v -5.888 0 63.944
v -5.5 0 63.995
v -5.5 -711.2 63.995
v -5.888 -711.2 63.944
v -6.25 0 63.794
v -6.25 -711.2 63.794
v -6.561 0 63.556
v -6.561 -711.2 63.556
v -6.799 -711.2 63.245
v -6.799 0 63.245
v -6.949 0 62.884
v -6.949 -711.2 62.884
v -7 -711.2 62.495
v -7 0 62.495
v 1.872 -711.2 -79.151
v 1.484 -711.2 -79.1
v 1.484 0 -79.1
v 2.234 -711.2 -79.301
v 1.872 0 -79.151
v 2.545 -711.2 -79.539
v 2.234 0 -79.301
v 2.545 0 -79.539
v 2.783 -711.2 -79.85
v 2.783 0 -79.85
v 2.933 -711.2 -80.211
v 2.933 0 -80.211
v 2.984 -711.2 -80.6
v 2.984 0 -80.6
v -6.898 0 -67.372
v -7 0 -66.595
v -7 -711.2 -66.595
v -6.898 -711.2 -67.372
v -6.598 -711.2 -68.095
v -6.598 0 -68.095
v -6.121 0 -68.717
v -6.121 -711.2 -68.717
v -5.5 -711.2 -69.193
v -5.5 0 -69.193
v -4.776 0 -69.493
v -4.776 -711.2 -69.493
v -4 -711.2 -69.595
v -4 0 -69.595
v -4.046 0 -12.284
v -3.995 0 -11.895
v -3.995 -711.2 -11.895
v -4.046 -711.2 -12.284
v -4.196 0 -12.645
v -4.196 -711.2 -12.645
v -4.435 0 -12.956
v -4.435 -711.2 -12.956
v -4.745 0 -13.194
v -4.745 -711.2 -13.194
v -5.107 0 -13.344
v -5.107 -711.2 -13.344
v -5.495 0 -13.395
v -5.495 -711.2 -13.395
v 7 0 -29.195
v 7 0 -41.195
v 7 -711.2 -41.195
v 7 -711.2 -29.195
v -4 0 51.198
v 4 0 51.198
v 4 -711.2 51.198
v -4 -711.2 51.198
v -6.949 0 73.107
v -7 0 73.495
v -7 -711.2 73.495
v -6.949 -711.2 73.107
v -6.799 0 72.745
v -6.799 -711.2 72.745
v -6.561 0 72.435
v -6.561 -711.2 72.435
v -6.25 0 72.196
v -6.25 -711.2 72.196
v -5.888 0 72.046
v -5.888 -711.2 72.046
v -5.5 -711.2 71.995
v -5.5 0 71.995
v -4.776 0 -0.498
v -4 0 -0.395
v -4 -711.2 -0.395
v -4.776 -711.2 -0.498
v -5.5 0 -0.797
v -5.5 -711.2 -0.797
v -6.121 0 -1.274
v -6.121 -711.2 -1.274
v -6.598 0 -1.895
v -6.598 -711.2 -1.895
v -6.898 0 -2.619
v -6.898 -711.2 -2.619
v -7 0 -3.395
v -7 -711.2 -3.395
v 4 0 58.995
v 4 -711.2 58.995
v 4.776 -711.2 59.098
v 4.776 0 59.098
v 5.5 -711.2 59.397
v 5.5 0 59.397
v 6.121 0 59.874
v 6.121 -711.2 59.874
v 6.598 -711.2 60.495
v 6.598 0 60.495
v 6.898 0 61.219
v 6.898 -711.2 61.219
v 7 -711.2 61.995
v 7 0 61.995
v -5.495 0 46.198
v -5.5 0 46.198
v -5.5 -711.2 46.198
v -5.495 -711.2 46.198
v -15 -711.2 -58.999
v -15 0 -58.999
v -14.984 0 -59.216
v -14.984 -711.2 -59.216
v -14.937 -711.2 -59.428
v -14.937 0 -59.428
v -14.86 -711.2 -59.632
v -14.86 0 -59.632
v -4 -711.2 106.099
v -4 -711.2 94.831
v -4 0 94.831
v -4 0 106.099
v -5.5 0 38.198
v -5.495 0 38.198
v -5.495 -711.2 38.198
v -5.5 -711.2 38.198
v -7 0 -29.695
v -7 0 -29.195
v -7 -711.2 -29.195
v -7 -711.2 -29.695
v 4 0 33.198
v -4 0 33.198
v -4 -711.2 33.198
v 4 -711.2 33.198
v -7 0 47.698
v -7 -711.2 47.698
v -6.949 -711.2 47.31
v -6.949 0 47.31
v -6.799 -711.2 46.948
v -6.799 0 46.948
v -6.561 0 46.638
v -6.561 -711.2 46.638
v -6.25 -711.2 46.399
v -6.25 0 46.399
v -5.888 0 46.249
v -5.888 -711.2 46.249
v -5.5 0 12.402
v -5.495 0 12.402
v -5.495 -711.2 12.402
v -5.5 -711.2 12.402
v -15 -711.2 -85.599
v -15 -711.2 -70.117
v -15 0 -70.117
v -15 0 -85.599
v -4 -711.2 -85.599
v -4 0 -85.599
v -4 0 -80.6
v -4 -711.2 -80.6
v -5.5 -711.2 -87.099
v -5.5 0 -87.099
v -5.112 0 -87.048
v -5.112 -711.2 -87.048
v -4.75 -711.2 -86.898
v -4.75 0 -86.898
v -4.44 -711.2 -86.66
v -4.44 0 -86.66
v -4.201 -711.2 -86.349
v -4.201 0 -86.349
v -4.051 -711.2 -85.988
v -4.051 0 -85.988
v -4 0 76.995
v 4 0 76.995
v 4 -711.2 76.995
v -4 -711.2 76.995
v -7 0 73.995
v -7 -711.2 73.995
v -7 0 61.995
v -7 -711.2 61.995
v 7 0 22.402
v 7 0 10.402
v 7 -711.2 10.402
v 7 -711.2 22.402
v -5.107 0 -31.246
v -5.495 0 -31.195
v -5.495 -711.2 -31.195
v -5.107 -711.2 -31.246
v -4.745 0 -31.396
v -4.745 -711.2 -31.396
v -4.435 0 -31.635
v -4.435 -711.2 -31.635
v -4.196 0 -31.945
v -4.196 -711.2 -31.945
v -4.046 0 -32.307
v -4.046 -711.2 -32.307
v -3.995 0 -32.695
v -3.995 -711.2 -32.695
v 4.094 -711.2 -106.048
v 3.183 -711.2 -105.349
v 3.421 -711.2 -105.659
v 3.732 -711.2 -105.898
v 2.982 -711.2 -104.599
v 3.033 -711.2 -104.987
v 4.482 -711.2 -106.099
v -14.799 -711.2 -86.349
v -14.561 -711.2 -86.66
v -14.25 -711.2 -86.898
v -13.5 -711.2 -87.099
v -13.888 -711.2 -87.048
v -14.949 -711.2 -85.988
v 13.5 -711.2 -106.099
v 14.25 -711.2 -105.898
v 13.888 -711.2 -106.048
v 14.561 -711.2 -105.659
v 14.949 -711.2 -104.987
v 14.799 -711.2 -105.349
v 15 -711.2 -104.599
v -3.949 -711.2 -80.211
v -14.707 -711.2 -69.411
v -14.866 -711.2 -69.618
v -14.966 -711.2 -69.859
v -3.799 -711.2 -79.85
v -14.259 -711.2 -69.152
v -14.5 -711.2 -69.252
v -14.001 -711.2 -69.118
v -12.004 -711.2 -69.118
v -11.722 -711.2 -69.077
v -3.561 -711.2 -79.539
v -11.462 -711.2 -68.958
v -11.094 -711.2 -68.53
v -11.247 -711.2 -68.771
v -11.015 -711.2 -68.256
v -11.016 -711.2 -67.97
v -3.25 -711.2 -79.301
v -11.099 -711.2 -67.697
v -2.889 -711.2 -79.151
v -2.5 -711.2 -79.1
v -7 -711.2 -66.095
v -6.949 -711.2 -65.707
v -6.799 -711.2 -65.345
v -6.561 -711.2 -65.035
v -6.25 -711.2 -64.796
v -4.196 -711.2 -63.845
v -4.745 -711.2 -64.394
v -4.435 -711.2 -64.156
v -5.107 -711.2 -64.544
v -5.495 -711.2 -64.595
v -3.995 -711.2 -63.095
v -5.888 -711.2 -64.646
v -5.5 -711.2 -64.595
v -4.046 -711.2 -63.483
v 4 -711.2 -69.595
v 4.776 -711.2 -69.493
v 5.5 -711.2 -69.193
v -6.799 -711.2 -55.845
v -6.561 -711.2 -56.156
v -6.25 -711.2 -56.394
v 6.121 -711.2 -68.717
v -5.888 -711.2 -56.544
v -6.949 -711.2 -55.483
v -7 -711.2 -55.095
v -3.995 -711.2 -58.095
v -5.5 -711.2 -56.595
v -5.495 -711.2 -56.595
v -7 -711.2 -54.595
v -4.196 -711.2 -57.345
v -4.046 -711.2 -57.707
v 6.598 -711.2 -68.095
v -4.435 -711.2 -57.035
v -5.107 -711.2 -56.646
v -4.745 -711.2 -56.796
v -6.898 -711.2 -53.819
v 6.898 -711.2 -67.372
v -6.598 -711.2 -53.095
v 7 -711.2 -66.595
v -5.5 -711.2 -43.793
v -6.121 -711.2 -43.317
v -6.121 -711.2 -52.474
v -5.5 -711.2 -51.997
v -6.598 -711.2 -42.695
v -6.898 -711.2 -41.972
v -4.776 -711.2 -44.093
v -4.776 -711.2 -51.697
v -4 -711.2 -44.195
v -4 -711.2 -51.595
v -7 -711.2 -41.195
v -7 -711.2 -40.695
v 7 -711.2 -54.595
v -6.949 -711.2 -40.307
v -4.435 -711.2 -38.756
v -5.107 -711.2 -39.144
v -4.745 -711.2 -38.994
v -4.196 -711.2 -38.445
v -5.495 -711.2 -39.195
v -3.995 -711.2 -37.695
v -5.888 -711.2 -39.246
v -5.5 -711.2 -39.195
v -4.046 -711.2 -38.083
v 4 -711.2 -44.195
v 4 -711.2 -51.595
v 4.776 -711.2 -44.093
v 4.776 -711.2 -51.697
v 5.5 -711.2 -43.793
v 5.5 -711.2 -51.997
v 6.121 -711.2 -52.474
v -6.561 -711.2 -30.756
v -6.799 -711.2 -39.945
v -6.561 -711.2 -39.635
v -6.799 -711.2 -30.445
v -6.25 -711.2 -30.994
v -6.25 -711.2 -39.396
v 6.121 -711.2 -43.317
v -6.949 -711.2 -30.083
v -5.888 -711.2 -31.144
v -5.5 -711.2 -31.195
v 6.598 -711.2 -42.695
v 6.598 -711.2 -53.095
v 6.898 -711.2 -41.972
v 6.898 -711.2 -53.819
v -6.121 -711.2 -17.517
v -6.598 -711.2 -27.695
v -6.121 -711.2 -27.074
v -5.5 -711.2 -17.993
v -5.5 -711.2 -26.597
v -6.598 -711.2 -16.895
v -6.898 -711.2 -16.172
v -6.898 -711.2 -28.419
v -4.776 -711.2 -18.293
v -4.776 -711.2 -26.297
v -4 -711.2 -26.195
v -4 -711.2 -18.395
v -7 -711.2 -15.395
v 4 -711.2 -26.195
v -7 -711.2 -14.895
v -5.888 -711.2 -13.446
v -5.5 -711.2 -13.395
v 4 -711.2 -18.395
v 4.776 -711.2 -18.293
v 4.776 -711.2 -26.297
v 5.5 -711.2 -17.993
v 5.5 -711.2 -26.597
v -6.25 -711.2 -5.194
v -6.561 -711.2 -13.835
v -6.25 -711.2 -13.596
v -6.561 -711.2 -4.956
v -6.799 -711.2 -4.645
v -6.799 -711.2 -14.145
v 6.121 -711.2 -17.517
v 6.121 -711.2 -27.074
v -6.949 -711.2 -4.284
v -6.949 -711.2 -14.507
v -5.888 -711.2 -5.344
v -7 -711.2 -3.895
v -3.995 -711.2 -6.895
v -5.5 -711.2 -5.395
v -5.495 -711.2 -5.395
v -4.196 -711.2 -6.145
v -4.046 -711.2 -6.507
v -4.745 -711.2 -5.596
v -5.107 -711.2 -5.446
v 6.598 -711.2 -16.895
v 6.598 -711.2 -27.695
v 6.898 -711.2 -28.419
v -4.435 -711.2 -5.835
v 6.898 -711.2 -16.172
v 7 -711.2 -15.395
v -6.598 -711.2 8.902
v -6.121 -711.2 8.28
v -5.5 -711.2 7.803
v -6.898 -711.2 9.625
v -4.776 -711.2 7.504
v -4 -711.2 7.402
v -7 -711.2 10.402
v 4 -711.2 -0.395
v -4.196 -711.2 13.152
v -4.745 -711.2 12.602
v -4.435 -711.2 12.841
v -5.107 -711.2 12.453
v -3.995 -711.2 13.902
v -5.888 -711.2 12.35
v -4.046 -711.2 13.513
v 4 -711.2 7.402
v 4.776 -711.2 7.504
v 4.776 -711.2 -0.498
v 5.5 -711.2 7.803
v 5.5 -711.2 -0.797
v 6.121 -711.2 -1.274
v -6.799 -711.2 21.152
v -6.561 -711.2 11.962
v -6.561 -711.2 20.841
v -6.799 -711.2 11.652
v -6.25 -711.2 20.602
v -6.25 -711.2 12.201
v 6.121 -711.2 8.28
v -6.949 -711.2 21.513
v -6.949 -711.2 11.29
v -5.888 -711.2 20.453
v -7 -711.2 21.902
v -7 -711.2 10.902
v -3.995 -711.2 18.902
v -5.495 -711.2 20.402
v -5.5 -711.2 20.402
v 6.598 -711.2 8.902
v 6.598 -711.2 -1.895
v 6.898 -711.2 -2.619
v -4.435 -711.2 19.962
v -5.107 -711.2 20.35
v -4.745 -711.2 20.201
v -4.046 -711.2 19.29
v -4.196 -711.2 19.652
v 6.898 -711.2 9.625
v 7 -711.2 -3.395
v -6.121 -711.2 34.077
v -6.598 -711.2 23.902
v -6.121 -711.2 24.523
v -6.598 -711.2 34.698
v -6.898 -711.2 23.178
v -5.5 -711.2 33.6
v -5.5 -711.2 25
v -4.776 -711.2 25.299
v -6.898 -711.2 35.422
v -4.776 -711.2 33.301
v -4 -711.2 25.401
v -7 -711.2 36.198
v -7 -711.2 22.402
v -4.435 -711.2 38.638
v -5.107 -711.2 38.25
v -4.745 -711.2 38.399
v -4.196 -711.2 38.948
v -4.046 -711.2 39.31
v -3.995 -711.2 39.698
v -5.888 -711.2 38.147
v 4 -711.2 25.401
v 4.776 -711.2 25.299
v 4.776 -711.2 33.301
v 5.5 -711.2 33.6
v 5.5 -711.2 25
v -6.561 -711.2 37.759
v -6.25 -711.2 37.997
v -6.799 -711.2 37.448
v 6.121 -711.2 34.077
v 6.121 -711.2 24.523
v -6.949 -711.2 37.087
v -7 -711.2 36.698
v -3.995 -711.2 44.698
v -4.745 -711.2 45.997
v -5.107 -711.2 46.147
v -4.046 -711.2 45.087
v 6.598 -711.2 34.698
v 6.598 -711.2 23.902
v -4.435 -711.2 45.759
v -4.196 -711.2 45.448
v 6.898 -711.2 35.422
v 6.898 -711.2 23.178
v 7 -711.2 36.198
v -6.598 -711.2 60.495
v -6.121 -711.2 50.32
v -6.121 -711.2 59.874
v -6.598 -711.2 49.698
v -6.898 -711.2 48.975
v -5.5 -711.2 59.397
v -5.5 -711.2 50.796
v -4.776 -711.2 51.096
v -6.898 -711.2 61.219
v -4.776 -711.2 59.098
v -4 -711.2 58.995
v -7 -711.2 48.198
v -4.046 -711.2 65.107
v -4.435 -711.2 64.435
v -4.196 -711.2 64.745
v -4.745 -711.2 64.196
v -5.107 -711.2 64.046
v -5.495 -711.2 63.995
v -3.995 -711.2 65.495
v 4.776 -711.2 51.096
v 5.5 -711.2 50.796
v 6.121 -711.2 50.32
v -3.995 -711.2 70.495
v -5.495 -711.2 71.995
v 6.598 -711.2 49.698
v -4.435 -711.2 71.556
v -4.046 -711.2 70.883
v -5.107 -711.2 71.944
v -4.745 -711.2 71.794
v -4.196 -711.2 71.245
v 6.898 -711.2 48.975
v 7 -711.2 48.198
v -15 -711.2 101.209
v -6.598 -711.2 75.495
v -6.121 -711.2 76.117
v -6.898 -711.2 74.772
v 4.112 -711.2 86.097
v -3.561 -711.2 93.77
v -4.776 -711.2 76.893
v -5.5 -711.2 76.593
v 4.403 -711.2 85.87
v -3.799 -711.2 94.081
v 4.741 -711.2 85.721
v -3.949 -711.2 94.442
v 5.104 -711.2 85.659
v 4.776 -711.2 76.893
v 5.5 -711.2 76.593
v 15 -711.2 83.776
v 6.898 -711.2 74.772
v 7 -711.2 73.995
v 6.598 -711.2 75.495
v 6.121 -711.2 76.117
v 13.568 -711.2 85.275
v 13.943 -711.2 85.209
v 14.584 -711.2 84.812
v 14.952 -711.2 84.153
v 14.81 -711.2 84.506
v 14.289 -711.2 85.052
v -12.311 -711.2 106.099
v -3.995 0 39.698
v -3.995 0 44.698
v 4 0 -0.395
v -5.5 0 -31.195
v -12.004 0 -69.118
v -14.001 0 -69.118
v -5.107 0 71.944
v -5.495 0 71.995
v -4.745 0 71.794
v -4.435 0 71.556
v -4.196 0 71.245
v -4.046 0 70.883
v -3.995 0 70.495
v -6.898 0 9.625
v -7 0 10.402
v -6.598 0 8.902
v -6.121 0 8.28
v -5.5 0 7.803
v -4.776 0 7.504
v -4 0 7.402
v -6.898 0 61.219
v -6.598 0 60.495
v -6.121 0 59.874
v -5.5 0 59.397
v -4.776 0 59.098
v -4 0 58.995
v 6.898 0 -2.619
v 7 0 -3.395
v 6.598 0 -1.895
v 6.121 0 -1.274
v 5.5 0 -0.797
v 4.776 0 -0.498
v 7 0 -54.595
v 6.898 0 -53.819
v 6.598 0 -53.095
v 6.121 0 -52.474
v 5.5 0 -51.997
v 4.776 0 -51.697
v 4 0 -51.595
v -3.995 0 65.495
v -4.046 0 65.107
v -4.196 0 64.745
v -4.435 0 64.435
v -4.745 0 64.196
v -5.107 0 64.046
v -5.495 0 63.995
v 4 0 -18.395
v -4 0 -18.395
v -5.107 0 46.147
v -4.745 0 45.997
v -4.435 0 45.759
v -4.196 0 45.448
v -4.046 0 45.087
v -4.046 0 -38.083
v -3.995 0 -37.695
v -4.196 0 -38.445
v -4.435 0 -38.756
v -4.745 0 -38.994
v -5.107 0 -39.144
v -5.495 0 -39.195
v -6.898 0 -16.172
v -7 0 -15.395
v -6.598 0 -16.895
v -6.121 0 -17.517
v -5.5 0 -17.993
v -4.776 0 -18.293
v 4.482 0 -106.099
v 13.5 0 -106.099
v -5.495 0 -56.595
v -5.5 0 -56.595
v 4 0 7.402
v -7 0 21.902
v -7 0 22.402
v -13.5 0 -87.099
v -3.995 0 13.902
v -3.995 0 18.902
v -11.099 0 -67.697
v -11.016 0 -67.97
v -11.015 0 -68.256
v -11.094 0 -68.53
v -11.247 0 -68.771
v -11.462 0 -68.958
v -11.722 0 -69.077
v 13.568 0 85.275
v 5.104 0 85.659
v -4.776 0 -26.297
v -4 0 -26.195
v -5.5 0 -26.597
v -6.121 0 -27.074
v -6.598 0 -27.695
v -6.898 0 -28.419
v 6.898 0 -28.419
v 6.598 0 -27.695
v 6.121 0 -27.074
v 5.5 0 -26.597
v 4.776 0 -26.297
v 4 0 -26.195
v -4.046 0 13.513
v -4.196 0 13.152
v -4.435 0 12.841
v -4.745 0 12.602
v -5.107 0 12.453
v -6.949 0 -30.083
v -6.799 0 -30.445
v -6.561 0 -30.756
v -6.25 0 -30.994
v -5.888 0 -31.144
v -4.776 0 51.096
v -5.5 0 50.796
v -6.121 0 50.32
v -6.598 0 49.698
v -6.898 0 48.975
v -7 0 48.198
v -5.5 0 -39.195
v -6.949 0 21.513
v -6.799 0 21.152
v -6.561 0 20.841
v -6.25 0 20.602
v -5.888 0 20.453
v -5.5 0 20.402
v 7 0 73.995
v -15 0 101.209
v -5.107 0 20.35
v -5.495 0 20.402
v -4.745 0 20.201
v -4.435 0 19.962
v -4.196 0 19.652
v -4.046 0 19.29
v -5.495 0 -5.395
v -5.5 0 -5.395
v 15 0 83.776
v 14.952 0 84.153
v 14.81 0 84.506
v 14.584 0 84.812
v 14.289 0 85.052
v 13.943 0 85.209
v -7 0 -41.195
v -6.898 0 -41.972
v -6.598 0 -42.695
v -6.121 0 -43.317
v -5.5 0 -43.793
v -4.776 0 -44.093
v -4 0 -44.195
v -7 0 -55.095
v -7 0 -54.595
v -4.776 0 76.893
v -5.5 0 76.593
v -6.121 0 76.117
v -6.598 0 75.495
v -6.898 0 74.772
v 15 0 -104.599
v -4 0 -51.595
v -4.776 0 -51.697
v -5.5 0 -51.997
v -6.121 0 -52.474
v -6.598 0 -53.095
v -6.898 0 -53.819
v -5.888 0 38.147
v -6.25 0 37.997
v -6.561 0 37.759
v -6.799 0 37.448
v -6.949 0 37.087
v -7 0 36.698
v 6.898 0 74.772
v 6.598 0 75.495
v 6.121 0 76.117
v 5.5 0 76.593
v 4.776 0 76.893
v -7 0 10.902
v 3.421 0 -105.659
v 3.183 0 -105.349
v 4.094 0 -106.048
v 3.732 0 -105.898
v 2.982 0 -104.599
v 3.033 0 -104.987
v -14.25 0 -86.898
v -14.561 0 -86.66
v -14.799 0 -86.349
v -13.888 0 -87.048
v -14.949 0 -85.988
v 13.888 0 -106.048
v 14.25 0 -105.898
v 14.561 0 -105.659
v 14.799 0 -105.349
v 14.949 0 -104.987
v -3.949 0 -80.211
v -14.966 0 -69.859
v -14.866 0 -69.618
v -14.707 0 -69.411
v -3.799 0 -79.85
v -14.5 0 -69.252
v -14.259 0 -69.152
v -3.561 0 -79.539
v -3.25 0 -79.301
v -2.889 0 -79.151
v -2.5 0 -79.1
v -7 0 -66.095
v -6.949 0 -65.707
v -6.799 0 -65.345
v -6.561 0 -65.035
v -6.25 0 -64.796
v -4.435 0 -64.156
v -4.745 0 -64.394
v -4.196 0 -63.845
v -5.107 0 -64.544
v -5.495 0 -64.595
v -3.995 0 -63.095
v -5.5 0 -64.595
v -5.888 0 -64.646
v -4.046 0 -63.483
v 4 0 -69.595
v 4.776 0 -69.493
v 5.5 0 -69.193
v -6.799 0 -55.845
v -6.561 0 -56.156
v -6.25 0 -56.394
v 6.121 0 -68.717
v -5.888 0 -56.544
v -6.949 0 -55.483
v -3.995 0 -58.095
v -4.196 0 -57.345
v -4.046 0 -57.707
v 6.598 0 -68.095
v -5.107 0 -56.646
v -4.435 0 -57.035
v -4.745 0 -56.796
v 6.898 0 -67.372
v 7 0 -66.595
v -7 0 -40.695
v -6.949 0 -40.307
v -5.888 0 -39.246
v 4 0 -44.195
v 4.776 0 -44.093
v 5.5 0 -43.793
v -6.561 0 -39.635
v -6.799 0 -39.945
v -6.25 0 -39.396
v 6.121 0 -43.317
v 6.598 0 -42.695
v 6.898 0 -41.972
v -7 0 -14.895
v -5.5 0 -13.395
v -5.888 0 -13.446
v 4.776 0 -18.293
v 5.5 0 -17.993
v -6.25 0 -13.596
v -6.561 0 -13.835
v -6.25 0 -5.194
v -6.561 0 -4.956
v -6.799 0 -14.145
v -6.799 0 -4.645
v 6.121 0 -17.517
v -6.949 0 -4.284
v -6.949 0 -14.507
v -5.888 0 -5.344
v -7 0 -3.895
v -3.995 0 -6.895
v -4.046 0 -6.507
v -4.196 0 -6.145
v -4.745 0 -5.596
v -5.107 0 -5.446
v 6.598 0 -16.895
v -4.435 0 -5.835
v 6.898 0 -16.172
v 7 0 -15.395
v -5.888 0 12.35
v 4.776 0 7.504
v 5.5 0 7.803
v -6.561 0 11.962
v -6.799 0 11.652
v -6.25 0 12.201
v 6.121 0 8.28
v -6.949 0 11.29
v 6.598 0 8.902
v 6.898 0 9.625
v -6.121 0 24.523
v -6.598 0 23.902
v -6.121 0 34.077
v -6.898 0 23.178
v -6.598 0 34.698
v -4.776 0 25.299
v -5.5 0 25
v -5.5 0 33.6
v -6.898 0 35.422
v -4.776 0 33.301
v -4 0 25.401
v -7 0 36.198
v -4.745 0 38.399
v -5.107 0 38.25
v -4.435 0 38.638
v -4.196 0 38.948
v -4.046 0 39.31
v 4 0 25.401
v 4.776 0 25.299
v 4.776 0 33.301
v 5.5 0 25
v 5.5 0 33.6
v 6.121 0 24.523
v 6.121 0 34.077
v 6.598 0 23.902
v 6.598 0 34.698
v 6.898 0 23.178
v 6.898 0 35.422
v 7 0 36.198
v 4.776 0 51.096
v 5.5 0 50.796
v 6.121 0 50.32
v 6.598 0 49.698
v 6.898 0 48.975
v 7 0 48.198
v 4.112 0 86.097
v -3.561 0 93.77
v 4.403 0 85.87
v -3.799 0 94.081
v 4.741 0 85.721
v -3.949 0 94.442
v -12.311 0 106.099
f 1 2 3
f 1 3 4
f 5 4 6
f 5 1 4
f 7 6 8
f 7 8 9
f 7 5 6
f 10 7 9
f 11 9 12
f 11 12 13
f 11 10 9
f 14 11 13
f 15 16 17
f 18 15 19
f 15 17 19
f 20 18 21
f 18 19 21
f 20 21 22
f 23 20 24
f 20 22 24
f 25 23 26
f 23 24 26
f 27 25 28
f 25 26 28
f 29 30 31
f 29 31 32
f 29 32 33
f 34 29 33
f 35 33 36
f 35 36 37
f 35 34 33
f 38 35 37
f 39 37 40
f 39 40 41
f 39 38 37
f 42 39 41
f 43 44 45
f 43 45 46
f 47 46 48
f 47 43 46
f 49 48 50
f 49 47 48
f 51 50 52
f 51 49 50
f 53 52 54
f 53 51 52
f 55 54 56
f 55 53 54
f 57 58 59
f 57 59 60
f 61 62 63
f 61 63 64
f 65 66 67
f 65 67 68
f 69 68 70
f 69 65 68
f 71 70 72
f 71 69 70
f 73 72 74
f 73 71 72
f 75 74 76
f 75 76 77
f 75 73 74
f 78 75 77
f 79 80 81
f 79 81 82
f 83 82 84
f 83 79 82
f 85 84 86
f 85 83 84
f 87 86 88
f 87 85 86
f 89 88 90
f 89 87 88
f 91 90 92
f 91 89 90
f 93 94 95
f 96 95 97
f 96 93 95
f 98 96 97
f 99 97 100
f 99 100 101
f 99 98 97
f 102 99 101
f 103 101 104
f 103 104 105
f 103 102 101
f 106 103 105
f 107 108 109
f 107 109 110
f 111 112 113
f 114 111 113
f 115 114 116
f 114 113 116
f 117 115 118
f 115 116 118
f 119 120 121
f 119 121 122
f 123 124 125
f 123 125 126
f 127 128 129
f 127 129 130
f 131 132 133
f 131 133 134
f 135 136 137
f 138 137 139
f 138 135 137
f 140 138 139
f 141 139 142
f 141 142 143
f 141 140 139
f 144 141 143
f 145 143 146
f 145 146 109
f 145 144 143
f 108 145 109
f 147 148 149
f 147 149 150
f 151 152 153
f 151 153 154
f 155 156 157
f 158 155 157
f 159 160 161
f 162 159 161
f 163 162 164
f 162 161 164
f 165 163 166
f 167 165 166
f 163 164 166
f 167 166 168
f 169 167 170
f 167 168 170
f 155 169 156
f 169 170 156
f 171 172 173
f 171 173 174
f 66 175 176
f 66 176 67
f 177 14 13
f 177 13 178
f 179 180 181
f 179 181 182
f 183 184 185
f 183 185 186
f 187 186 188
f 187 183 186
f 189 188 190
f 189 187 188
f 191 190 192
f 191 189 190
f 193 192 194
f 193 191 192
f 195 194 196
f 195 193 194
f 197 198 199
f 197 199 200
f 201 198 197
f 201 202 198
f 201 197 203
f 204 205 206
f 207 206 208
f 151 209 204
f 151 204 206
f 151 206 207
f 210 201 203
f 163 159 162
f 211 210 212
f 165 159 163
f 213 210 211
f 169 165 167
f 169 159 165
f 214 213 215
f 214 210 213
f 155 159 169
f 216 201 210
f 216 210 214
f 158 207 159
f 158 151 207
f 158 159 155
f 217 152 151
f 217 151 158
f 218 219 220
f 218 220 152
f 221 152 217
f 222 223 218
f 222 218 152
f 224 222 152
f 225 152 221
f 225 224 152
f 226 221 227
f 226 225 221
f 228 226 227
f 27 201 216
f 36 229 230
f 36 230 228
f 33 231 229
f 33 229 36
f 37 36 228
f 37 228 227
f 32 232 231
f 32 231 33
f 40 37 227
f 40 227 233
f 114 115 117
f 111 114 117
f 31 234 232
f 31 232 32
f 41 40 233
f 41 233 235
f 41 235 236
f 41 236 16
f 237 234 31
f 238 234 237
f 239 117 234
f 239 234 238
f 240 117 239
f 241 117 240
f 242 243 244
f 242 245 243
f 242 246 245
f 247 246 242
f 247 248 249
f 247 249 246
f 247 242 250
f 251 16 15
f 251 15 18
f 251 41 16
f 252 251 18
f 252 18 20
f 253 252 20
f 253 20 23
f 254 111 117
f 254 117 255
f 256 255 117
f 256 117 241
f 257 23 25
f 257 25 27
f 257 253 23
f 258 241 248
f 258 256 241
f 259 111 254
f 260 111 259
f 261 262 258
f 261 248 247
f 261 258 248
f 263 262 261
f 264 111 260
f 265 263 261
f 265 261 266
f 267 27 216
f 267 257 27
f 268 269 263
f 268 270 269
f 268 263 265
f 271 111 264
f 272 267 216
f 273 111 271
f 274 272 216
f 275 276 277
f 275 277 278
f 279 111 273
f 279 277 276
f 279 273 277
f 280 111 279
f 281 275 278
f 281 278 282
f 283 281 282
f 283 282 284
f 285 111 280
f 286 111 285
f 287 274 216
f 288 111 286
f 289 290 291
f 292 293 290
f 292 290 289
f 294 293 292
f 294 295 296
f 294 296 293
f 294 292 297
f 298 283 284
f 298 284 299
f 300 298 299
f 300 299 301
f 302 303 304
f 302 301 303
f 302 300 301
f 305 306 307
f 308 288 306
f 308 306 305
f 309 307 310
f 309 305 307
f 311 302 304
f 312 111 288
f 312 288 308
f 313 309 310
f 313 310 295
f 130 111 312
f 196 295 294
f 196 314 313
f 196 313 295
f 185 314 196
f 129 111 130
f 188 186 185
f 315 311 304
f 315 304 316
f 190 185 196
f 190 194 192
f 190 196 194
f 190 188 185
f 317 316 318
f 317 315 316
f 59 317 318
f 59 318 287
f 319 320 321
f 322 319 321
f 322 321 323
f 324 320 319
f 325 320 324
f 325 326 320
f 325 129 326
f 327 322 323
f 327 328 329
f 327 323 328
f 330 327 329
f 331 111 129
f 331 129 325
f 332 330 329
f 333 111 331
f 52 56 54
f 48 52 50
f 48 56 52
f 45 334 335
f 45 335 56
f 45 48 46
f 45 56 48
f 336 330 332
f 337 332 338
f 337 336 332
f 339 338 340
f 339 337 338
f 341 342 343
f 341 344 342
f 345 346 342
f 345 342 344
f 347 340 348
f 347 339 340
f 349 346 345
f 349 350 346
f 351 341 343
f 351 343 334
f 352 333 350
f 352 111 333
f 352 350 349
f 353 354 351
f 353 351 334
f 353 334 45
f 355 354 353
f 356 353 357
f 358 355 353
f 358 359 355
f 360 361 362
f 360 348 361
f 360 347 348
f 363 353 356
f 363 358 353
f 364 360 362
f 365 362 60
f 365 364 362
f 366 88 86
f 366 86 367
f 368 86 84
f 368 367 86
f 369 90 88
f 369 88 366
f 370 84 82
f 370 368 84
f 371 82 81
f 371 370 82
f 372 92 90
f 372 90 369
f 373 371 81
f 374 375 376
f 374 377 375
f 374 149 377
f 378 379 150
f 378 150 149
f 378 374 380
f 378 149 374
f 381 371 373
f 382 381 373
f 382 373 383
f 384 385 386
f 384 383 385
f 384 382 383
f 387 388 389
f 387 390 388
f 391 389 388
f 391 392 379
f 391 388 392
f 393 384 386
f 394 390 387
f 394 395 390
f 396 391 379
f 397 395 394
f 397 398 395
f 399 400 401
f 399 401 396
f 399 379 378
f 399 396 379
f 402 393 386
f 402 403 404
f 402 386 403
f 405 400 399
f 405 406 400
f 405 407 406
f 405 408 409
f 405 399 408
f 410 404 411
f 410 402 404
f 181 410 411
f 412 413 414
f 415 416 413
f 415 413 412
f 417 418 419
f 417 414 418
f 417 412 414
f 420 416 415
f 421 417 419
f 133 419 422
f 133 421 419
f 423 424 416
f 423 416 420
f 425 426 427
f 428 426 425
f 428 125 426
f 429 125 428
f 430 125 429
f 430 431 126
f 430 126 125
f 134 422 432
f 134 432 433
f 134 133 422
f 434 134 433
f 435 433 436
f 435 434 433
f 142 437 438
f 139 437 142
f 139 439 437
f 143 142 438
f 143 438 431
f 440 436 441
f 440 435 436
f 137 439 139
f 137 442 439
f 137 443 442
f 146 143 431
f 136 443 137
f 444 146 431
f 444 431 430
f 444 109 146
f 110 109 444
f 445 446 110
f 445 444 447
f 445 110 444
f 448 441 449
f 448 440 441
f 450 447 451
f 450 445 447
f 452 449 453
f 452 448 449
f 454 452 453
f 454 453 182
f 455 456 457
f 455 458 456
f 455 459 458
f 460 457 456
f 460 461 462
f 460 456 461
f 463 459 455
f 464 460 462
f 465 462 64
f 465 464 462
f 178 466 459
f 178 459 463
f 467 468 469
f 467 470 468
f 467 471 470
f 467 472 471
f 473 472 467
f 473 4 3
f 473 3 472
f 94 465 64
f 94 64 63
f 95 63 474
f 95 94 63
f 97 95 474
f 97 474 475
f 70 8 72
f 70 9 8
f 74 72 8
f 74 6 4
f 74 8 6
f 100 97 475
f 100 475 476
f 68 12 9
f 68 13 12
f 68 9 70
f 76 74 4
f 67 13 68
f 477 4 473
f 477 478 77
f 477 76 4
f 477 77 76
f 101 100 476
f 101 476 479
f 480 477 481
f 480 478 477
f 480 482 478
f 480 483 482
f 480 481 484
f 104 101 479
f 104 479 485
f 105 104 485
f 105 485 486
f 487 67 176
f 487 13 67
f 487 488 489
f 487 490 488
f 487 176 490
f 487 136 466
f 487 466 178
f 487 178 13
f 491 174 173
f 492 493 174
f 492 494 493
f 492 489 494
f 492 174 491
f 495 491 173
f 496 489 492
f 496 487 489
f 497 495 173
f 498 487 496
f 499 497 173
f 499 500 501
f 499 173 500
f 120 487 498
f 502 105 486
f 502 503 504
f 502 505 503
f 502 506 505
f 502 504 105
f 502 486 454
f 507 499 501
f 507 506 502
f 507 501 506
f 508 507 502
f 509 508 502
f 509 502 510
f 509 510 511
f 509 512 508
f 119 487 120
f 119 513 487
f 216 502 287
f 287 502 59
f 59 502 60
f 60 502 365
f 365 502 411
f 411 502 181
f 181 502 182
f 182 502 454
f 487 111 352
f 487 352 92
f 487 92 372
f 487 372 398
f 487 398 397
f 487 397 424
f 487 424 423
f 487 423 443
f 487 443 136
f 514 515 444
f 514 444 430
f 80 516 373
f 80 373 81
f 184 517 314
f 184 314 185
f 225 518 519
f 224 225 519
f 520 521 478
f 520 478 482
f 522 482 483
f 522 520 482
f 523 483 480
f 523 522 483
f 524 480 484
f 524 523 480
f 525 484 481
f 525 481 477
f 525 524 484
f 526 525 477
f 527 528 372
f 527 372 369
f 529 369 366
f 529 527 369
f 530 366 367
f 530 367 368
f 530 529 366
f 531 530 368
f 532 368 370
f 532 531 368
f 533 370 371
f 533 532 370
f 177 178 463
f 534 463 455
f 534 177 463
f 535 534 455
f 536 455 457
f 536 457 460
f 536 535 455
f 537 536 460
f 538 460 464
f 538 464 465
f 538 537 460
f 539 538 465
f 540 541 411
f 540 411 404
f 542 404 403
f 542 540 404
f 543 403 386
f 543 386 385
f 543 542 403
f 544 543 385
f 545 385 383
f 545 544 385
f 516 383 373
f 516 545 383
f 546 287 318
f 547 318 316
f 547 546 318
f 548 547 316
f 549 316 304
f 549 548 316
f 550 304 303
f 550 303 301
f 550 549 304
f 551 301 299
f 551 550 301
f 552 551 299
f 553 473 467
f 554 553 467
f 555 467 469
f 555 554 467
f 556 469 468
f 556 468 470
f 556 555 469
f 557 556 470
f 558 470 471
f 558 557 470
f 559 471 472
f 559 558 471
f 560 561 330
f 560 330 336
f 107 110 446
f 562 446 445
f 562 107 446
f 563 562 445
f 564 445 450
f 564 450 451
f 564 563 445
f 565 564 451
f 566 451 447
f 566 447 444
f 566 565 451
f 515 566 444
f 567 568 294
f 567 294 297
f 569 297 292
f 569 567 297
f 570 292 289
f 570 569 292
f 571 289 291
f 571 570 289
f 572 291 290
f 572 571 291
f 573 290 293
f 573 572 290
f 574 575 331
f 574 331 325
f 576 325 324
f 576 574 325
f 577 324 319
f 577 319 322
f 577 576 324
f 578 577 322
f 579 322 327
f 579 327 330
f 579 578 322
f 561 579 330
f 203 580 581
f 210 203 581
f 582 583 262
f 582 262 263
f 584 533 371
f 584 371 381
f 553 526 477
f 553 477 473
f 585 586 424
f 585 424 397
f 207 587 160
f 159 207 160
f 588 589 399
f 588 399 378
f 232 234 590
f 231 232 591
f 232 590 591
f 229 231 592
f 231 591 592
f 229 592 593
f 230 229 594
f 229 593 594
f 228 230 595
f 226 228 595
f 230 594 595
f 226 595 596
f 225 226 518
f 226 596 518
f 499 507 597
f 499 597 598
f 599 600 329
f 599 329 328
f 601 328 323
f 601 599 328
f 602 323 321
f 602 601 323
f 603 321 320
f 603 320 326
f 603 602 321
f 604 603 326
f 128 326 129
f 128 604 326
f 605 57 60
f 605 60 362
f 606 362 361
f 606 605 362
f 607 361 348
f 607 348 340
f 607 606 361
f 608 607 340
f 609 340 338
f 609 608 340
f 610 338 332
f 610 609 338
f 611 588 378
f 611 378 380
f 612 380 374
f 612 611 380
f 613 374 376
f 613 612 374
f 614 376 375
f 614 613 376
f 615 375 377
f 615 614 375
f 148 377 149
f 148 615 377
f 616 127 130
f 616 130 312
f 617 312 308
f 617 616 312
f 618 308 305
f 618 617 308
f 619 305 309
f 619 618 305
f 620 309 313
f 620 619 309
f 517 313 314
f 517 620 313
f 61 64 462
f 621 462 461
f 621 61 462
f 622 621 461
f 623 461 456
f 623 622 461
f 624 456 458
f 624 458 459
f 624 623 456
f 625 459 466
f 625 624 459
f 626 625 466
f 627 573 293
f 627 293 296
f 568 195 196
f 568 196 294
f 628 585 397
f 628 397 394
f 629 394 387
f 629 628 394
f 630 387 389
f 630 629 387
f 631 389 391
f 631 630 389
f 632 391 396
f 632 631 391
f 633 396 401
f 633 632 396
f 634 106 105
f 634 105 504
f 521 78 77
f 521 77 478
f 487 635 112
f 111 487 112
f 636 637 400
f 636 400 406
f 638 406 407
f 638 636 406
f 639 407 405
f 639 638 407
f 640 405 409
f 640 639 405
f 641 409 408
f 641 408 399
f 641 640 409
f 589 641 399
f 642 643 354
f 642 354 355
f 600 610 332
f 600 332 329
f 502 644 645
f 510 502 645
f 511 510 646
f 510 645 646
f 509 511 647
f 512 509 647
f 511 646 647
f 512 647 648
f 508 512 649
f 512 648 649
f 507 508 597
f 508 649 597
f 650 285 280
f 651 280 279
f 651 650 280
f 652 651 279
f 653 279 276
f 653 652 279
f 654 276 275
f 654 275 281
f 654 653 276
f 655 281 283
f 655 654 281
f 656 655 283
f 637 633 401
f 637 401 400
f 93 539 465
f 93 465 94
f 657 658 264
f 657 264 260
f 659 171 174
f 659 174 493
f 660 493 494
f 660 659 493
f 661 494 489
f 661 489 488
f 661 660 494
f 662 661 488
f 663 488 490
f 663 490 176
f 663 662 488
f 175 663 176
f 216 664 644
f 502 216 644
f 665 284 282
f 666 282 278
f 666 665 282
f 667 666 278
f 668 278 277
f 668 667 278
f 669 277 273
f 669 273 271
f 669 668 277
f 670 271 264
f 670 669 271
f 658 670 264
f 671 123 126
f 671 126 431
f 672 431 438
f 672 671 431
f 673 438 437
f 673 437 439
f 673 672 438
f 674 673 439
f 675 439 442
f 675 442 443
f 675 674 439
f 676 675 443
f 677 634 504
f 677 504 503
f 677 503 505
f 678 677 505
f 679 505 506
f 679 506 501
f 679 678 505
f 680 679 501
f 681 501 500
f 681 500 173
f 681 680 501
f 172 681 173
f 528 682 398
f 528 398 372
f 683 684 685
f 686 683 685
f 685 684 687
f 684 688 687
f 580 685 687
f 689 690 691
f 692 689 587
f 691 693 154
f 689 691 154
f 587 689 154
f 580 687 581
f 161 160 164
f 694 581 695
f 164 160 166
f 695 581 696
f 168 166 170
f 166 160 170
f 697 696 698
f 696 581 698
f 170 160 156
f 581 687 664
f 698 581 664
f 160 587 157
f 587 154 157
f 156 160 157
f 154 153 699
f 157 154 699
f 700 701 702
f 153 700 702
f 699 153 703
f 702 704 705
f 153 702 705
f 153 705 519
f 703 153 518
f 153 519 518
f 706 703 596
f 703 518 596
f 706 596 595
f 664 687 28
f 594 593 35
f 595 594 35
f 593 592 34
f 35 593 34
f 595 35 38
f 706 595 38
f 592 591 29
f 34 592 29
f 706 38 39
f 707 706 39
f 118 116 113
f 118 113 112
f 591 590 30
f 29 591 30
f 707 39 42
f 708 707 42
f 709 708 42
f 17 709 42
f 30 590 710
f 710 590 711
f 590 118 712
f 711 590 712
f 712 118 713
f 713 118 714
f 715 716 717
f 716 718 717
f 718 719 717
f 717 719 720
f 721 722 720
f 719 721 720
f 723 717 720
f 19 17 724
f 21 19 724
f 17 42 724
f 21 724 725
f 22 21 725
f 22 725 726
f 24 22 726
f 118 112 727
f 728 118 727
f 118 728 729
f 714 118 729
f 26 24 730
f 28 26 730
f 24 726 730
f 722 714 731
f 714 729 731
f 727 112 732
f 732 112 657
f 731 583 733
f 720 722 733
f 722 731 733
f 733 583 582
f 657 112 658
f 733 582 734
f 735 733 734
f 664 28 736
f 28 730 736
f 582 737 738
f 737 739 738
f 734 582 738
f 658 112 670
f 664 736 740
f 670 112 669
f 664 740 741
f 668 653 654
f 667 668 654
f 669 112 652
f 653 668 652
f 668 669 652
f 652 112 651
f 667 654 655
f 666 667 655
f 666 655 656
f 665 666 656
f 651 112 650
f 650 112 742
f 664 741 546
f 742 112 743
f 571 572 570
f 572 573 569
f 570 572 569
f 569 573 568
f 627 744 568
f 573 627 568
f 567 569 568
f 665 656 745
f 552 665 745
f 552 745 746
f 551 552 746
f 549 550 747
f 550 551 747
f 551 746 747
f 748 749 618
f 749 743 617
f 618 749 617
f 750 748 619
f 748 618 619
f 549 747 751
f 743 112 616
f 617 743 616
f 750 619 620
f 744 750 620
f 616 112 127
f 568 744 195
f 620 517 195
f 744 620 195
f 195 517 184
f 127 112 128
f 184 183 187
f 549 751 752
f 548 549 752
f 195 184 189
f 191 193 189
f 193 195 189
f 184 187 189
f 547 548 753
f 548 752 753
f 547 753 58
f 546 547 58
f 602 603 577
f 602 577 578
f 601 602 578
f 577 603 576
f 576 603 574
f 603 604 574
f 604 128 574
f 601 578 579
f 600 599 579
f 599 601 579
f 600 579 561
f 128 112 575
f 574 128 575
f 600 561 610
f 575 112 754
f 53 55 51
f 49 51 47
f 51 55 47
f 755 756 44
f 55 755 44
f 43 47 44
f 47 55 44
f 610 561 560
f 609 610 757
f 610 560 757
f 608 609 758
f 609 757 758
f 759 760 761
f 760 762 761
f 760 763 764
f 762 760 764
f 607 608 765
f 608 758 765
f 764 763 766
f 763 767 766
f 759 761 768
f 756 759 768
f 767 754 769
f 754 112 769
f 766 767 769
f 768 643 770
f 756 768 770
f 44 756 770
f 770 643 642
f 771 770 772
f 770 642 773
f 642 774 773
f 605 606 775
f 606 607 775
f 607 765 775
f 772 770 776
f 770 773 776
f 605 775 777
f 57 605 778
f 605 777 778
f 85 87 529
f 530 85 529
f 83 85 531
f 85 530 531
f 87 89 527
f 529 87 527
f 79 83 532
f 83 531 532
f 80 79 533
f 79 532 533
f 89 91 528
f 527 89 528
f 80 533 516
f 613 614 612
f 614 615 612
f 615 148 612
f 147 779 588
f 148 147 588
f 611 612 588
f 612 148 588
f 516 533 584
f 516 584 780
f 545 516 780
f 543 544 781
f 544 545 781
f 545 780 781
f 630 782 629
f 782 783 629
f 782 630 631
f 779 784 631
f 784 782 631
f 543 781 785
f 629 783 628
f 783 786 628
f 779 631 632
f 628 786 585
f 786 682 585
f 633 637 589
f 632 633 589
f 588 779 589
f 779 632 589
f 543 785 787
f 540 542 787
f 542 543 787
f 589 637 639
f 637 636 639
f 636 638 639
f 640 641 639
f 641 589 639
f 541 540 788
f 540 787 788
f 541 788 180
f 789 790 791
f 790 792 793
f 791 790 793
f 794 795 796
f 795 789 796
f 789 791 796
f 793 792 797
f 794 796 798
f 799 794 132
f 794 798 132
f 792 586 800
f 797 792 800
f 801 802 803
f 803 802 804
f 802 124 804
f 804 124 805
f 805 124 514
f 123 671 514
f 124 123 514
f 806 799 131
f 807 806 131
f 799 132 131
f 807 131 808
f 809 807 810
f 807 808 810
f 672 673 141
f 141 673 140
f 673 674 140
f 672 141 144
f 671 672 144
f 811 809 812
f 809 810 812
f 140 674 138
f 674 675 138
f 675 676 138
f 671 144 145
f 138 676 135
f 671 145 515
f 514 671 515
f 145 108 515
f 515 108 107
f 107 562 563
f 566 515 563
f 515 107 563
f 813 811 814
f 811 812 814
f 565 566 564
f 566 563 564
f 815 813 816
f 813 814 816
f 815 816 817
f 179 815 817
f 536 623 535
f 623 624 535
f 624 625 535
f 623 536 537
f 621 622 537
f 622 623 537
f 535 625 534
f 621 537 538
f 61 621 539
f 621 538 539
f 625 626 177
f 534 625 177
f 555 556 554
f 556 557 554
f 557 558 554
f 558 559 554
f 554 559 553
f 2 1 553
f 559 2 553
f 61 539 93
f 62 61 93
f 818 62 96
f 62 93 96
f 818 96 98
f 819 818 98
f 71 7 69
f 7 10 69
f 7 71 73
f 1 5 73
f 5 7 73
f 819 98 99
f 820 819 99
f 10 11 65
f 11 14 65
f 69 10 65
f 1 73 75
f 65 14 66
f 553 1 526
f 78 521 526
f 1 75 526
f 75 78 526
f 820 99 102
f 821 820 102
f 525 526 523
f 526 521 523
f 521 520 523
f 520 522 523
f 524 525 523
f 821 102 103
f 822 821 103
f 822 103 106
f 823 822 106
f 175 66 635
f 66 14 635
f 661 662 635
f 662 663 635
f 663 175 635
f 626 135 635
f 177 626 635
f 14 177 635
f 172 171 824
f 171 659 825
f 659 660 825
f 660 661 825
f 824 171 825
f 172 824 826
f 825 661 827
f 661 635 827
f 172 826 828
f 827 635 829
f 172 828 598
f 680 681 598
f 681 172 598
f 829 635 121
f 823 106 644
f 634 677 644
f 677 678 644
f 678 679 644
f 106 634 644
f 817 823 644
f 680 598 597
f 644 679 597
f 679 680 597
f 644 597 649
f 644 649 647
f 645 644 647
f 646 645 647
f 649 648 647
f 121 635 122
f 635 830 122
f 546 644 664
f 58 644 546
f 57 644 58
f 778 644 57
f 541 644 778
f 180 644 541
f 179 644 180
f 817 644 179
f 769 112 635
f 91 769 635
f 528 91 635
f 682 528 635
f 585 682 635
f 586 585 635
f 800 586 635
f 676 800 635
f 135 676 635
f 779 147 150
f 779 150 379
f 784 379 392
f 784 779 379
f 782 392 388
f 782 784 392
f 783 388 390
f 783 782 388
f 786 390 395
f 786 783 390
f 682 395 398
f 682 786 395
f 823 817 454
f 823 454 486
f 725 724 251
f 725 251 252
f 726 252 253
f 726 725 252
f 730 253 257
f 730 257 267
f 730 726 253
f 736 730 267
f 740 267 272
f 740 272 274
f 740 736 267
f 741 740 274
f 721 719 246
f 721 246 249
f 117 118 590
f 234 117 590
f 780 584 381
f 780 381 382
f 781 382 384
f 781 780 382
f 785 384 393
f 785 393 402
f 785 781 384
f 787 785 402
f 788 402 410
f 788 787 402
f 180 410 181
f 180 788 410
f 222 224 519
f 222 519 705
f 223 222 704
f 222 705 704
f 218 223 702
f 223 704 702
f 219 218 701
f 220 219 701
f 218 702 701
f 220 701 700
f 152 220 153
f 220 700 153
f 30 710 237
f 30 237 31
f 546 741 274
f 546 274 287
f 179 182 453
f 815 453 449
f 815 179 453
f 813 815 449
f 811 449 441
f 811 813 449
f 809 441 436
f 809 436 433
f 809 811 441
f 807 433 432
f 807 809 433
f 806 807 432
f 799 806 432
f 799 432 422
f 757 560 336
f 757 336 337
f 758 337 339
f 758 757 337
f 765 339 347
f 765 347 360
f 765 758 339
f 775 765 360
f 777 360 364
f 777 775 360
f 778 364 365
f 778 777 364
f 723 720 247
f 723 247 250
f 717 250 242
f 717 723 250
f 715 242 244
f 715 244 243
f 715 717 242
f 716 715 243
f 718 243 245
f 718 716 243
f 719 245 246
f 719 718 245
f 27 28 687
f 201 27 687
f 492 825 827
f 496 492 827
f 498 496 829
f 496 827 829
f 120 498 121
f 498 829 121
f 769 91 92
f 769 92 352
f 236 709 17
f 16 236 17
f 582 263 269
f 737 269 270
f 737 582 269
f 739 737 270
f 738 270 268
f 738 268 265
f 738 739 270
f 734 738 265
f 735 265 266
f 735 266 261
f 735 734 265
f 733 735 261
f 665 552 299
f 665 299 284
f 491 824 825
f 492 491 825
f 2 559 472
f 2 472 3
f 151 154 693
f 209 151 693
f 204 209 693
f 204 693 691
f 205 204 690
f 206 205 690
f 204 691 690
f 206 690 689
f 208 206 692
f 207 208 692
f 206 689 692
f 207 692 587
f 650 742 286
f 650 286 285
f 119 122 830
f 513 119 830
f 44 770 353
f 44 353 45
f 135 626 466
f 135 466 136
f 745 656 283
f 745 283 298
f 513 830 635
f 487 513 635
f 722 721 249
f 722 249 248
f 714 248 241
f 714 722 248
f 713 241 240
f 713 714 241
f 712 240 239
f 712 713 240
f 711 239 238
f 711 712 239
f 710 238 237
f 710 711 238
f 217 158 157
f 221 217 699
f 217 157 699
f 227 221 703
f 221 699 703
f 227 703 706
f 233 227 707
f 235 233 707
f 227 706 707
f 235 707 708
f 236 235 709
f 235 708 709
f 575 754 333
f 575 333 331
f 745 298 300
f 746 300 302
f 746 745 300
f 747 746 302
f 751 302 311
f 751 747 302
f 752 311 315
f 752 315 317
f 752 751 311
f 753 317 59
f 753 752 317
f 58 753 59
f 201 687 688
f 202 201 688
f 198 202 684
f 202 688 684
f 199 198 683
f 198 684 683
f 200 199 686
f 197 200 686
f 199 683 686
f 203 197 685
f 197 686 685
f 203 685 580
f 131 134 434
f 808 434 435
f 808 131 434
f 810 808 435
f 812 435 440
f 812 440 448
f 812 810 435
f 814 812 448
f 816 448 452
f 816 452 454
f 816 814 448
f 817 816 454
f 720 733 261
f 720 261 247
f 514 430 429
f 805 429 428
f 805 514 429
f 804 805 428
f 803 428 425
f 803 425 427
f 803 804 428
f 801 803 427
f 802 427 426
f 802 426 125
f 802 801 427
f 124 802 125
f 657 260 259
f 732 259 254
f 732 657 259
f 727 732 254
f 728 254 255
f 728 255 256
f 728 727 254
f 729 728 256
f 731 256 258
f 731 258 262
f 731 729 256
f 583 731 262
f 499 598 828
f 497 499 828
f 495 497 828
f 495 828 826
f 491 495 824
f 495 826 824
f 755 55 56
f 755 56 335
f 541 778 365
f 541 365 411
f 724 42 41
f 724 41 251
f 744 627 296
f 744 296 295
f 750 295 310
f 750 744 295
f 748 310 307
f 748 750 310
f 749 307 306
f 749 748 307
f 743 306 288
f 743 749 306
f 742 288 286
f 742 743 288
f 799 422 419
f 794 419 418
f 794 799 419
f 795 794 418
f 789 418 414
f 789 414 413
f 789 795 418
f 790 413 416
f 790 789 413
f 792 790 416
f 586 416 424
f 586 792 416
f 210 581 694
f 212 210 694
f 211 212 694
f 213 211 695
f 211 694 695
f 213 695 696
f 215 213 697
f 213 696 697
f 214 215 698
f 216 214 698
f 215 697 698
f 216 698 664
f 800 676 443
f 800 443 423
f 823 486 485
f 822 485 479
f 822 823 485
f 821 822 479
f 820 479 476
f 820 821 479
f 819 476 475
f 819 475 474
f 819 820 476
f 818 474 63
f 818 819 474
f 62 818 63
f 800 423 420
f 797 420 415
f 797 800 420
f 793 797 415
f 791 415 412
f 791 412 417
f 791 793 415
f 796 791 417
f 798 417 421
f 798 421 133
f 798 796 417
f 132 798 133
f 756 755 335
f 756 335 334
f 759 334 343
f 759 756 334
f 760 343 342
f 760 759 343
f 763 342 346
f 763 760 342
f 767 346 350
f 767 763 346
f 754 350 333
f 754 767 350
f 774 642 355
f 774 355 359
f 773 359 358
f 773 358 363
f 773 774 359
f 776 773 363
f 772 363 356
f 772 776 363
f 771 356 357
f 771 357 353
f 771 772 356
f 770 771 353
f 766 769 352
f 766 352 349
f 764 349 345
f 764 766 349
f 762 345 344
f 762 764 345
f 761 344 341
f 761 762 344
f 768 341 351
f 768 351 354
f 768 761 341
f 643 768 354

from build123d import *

# Parameters (mm, degrees)
F1_DEPTH = 711.2
F3_DEPTH = 711.2


# Not quite as in the source:
# - ends of sketch curves that miss each other by under 0.0002 mm in the source are joined


with BuildPart() as f1:
    # F0 (on Front) → F1 (new body)
    with BuildSketch(Plane.XZ):
        with BuildLine():
            ThreePointArc((-14.9999680608, -58.9985104), (-14.96444377, -59.322873513), (-14.8595551032, -59.6318585804))
            Line((-14.8595551032, -59.6318585804), (-11.0988328608, -67.6967912))
            ThreePointArc((-11.0988328608, -67.6967912), (-11.1617050028, -68.655791158), (-12.004294, -69.1180454046))
            Line((-12.004294, -69.1180454046), (-14.0009118, -69.1180736))
            ThreePointArc((-14.0009118, -69.1180736), (-14.707352628, -69.410690972), (-14.99997, -70.1171318))
            Line((-14.99997, -70.1171318), (-14.99997, -85.599397))
            ThreePointArc((-14.99997, -85.599397), (-14.5606310505, -86.6600550505), (-13.499973, -87.099394))
            Line((-13.499973, -87.099394), (-5.5003446, -87.099394))
            ThreePointArc((-5.5003446, -87.099394), (-4.4396865495, -86.6600550505), (-4.0003476, -85.599397))
            Line((-4.0003476, -85.599397), (-4.0003476, -80.5996356))
            ThreePointArc((-4.0003476, -80.5996356), (-3.5610086505, -79.5389775495), (-2.5003506, -79.0996386))
            Line((-2.5003506, -79.0996386), (1.4838426, -79.0996386))
            ThreePointArc((1.4838426, -79.0996386), (2.5445365709, -79.5390134712), (2.9838395966, -80.5997372))
            Line((2.9838395966, -80.5997372), (2.98196, -104.5986224))
            ThreePointArc((2.98196, -104.5986224), (3.4212540492, -105.6593625482), (4.481957, -106.0987464))
            Line((4.481957, -106.0987464), (13.499973, -106.0987464))
            ThreePointArc((13.499973, -106.0987464), (14.5606310505, -105.6594074505), (14.99997, -104.5987494))
            Line((14.99997, -104.5987494), (14.99997, 83.7761342))
            ThreePointArc((14.99997, 83.7761342), (14.5844487053, 84.8124273268), (13.5680958768, 85.2745834897))
            Line((13.5680958768, 85.2745834897), (5.104384, 85.6592902))
            ThreePointArc((5.104384, 85.6592902), (4.5671403109, 85.7853117853), (4.1118233495, 86.0970797495))
            Line((4.1118233495, 86.0970797495), (-3.5610038, 93.7699166))
            ThreePointArc((-3.5610038, 93.7699166), (-3.8861671271, 94.2565457995), (-4.0003476, 94.8305698))
            Line((-4.0003476, 94.8305698), (-4.0003476, 106.0987464))
            Line((-4.0003476, 106.0987464), (-12.3105164, 106.0987464))
            Line((-12.3105164, 106.0987464), (-14.99997, 101.2086876))
            Line((-14.99997, 101.2086876), (-14.9999680608, -58.9985104))
        make_face()
    extrude(amount=F1_DEPTH)

    # F2 (on Front) → F3 (cut)
    with BuildSketch(Plane.XZ):
        with BuildLine():
            ThreePointArc((-5.49529, -31.195264), (-4.4346319495, -31.6346029495), (-3.995293, -32.695261))
            Line((-3.995293, -32.695261), (-3.995293, -37.695251))
            ThreePointArc((-3.995293, -37.695251), (-4.4346319495, -38.7559090505), (-5.49529, -39.195248))
            Line((-5.49529, -39.195248), (-5.499989, -39.195248))
            ThreePointArc((-5.499989, -39.195248), (-6.5606470505, -39.6345869495), (-6.999986, -40.695245))
            Line((-6.999986, -40.695245), (-6.999986, -41.195244))
            ThreePointArc((-6.999986, -41.195244), (-6.1213081009, -43.3165601009), (-3.999992, -44.195238))
            Line((-3.999992, -44.195238), (3.999992, -44.195238))
            ThreePointArc((3.999992, -44.195238), (6.1213081009, -43.3165601009), (6.999986, -41.195244))
            Line((6.999986, -41.195244), (6.999986, -29.195268))
            ThreePointArc((6.999986, -29.195268), (6.1213081009, -27.0739518991), (3.999992, -26.195274))
            Line((3.999992, -26.195274), (-3.999992, -26.195274))
            ThreePointArc((-3.999992, -26.195274), (-6.1213081009, -27.0739518991), (-6.999986, -29.195268))
            Line((-6.999986, -29.195268), (-6.999986, -29.695267))
            ThreePointArc((-6.999986, -29.695267), (-6.5606470505, -30.7559250505), (-5.499989, -31.195264))
            Line((-5.499989, -31.195264), (-5.49529, -31.195264))
        make_face()
        with BuildLine():
            ThreePointArc((-5.49529, -56.595264), (-4.4346319495, -57.0346029495), (-3.995293, -58.095261))
            Line((-3.995293, -58.095261), (-3.995293, -63.095251))
            ThreePointArc((-3.995293, -63.095251), (-4.4346319495, -64.1559090505), (-5.49529, -64.595248))
            Line((-5.49529, -64.595248), (-5.499989, -64.595248))
            ThreePointArc((-5.499989, -64.595248), (-6.5606470505, -65.0345869495), (-6.999986, -66.095245))
            Line((-6.999986, -66.095245), (-6.999986, -66.595244))
            ThreePointArc((-6.999986, -66.595244), (-6.1213081009, -68.7165601009), (-3.999992, -69.595238))
            Line((-3.999992, -69.595238), (0, -69.595238))
            Line((0, -69.595238), (3.999992, -69.595238))
            ThreePointArc((3.999992, -69.595238), (6.1213081009, -68.7165601009), (6.999986, -66.595244))
            Line((6.999986, -66.595244), (6.999986, -54.595268))
            ThreePointArc((6.999986, -54.595268), (6.1213081009, -52.4739518991), (3.999992, -51.595274))
            Line((3.999992, -51.595274), (-3.999992, -51.595274))
            ThreePointArc((-3.999992, -51.595274), (-6.1213081009, -52.4739518991), (-6.999986, -54.595268))
            Line((-6.999986, -54.595268), (-6.999986, -55.095267))
            ThreePointArc((-6.999986, -55.095267), (-6.5606470505, -56.1559250505), (-5.499989, -56.595264))
            Line((-5.499989, -56.595264), (-5.49529, -56.595264))
        make_face()
        with BuildLine():
            ThreePointArc((-5.49529, -5.3953664), (-4.4346319495, -5.8347053495), (-3.995293, -6.8953634))
            Line((-3.995293, -6.8953634), (-3.995293, -11.8953534))
            ThreePointArc((-3.995293, -11.8953534), (-4.4346319495, -12.9560114505), (-5.49529, -13.3953504))
            Line((-5.49529, -13.3953504), (-5.499989, -13.3953504))
            ThreePointArc((-5.499989, -13.3953504), (-6.5606470505, -13.8346893495), (-6.999986, -14.8953474))
            Line((-6.999986, -14.8953474), (-6.999986, -15.3953464))
            ThreePointArc((-6.999986, -15.3953464), (-6.1213081009, -17.5166625009), (-3.999992, -18.3953404))
            Line((-3.999992, -18.3953404), (3.999992, -18.3953404))
            ThreePointArc((3.999992, -18.3953404), (6.1213081009, -17.5166625009), (6.999986, -15.3953464))
            Line((6.999986, -15.3953464), (6.999986, -3.3953704))
            ThreePointArc((6.999986, -3.3953704), (6.1213081009, -1.2740542991), (3.999992, -0.3953764))
            Line((3.999992, -0.3953764), (-3.999992, -0.3953764))
            ThreePointArc((-3.999992, -0.3953764), (-6.1213081009, -1.2740542991), (-6.999986, -3.3953704))
            Line((-6.999986, -3.3953704), (-6.999986, -3.8953694))
            ThreePointArc((-6.999986, -3.8953694), (-6.5606470505, -4.9560274505), (-5.499989, -5.3953664))
            Line((-5.499989, -5.3953664), (-5.49529, -5.3953664))
        make_face()
        with BuildLine():
            Line((-5.499989, 20.4015086), (-5.49529, 20.4015086))
            ThreePointArc((-5.49529, 20.4015086), (-4.4346319495, 19.9621696505), (-3.995293, 18.9015116))
            Line((-3.995293, 18.9015116), (-3.995293, 13.9015216))
            ThreePointArc((-3.995293, 13.9015216), (-4.4346319495, 12.8408635495), (-5.49529, 12.4015246))
            Line((-5.49529, 12.4015246), (-5.499989, 12.4015246))
            ThreePointArc((-5.499989, 12.4015246), (-6.5606470505, 11.9621856505), (-6.999986, 10.9015276))
            Line((-6.999986, 10.9015276), (-6.999986, 10.4015286))
            ThreePointArc((-6.999986, 10.4015286), (-6.1213081009, 8.2802124991), (-3.999992, 7.4015346))
            Line((-3.999992, 7.4015346), (3.999992, 7.4015346))
            ThreePointArc((3.999992, 7.4015346), (6.1213081009, 8.2802124991), (6.999986, 10.4015286))
            Line((6.999986, 10.4015286), (6.999986, 22.4015046))
            ThreePointArc((6.999986, 22.4015046), (6.1213081009, 24.5228207009), (3.999992, 25.4014986))
            Line((3.999992, 25.4014986), (-3.999992, 25.4014986))
            ThreePointArc((-3.999992, 25.4014986), (-6.1213081009, 24.5228207009), (-6.999986, 22.4015046))
            Line((-6.999986, 22.4015046), (-6.999986, 21.9015056))
            ThreePointArc((-6.999986, 21.9015056), (-6.5606470505, 20.8408475495), (-5.499989, 20.4015086))
        make_face()
        with BuildLine():
            Line((-5.499989, 46.1983836), (-5.49529, 46.1983836))
            ThreePointArc((-5.49529, 46.1983836), (-4.4346319495, 45.7590446505), (-3.995293, 44.6983866))
            Line((-3.995293, 44.6983866), (-3.995293, 39.6983966))
            ThreePointArc((-3.995293, 39.6983966), (-4.4346319495, 38.6377385495), (-5.49529, 38.1983996))
            Line((-5.49529, 38.1983996), (-5.499989, 38.1983996))
            ThreePointArc((-5.499989, 38.1983996), (-6.5606470505, 37.7590606505), (-6.999986, 36.6984026))
            Line((-6.999986, 36.6984026), (-6.999986, 36.1984036))
            ThreePointArc((-6.999986, 36.1984036), (-6.1213081009, 34.0770874991), (-3.999992, 33.1984096))
            Line((-3.999992, 33.1984096), (3.999992, 33.1984096))
            ThreePointArc((3.999992, 33.1984096), (6.1213081009, 34.0770874991), (6.999986, 36.1984036))
            Line((6.999986, 36.1984036), (6.999986, 48.1983796))
            ThreePointArc((6.999986, 48.1983796), (6.1213081009, 50.3196957009), (3.999992, 51.1983736))
            Line((3.999992, 51.1983736), (-3.999992, 51.1983736))
            ThreePointArc((-3.999992, 51.1983736), (-6.1213081009, 50.3196957009), (-6.999986, 48.1983796))
            Line((-6.999986, 48.1983796), (-6.999986, 47.6983806))
            ThreePointArc((-6.999986, 47.6983806), (-6.5606470505, 46.6377225495), (-5.499989, 46.1983836))
        make_face()
        with BuildLine():
            Line((-5.499989, 71.9952586), (-5.49529, 71.9952586))
            ThreePointArc((-5.49529, 71.9952586), (-4.4346319495, 71.5559196505), (-3.995293, 70.4952616))
            Line((-3.995293, 70.4952616), (-3.995293, 65.4952716))
            ThreePointArc((-3.995293, 65.4952716), (-4.4346319495, 64.4346135495), (-5.49529, 63.9952746))
            Line((-5.49529, 63.9952746), (-5.499989, 63.9952746))
            ThreePointArc((-5.499989, 63.9952746), (-6.5606470505, 63.5559356505), (-6.999986, 62.4952776))
            Line((-6.999986, 62.4952776), (-6.999986, 61.9952786))
            ThreePointArc((-6.999986, 61.9952786), (-6.1213081009, 59.8739624991), (-3.999992, 58.9952846))
            Line((-3.999992, 58.9952846), (3.999992, 58.9952846))
            ThreePointArc((3.999992, 58.9952846), (6.1213081009, 59.8739624991), (6.999986, 61.9952786))
            Line((6.999986, 61.9952786), (6.999986, 73.9952546))
            ThreePointArc((6.999986, 73.9952546), (6.1213081009, 76.1165707009), (3.999992, 76.9952486))
            Line((3.999992, 76.9952486), (-3.999992, 76.9952486))
            ThreePointArc((-3.999992, 76.9952486), (-6.1213081009, 76.1165707009), (-6.999986, 73.9952546))
            Line((-6.999986, 73.9952546), (-6.999986, 73.4952556))
            ThreePointArc((-6.999986, 73.4952556), (-6.5606470505, 72.4345975495), (-5.499989, 71.9952586))
        make_face()
    extrude(amount=F3_DEPTH, mode=Mode.SUBTRACT)


solid = f1.part
